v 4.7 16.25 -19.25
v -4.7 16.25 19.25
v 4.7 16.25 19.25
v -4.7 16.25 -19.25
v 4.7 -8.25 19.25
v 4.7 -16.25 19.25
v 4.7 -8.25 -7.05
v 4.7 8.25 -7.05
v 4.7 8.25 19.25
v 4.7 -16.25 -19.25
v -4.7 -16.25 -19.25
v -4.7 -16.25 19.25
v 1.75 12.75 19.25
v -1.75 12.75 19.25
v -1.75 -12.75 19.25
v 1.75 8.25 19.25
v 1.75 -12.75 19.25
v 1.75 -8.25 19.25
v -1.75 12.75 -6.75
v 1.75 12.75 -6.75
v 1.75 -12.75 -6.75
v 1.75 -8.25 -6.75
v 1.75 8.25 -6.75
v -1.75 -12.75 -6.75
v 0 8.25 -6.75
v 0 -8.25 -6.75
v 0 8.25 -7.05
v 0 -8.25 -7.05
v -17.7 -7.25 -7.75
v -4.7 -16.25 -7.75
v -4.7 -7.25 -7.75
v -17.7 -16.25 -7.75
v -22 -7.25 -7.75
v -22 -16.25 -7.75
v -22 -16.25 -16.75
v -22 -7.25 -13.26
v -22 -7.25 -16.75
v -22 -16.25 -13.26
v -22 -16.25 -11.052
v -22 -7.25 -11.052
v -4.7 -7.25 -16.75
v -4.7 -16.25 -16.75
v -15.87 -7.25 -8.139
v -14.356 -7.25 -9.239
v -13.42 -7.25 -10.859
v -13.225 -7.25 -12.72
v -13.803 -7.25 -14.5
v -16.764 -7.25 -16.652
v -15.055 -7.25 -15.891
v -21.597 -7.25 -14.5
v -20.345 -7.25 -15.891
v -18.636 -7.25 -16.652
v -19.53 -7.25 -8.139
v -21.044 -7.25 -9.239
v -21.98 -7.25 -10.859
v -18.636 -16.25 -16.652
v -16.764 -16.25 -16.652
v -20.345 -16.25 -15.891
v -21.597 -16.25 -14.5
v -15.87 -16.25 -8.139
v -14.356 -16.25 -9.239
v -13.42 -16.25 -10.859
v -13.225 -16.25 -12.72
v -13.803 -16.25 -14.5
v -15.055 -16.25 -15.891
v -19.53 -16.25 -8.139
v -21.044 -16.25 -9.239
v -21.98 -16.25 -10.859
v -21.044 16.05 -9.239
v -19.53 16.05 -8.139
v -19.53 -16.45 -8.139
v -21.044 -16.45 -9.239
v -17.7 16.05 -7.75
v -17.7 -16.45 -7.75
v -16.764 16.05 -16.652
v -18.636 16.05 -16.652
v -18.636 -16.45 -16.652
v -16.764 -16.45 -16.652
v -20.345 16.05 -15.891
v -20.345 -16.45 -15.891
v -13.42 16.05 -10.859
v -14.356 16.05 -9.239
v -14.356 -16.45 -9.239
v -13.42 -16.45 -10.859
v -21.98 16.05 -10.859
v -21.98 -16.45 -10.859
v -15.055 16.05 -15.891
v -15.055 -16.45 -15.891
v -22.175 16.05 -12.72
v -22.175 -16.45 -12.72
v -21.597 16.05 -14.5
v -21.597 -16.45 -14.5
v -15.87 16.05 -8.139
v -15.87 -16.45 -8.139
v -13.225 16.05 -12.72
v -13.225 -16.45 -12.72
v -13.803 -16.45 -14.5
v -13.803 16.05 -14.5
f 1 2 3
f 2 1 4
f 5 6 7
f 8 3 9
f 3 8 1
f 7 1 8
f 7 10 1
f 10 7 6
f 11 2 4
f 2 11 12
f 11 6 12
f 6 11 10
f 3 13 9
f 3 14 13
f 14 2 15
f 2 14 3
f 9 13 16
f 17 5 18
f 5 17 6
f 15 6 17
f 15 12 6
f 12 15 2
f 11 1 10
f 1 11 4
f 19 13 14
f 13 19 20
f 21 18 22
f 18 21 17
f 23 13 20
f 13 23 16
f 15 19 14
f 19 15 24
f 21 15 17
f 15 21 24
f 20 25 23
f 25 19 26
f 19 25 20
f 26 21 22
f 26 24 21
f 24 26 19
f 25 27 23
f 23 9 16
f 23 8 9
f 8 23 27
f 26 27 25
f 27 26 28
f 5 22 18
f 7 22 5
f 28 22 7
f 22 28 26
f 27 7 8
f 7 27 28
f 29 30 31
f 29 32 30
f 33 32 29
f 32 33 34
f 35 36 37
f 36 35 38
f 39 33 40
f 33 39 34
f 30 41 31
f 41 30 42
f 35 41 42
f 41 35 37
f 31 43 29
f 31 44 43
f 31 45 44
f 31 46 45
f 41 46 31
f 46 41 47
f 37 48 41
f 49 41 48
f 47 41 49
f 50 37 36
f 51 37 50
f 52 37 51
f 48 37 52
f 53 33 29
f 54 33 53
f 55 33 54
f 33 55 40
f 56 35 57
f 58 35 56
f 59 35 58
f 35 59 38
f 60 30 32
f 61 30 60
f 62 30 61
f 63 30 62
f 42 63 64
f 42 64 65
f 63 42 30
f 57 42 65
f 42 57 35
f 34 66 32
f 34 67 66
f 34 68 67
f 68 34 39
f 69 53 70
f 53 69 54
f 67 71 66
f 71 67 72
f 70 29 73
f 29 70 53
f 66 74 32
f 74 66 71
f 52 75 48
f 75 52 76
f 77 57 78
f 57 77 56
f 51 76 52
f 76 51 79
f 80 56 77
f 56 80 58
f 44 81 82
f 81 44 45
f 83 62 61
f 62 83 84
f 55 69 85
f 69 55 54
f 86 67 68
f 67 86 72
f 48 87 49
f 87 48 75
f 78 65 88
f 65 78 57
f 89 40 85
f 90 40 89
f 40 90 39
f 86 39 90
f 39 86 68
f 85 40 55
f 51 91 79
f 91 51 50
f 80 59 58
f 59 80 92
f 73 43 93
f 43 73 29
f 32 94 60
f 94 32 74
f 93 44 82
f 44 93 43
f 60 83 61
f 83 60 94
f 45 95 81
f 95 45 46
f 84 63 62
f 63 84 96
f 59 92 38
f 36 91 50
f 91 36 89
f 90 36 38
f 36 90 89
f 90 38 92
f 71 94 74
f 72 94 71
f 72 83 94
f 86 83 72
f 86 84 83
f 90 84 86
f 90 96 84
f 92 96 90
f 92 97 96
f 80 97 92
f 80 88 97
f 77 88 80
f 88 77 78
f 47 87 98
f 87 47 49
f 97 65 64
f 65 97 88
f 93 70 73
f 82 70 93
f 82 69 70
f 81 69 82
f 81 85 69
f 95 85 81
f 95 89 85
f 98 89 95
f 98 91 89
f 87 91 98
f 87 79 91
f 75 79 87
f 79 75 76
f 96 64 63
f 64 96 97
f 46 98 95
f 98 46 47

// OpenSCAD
/*
 *  OpenSCAD threaded rod holder 
 *  Copyright (C) 2013 Mogue Carpenter
 *
 *  License: LGPL 2.1 or later
 *
 *  A simple holder to hold a toilet seat
 *  onto a bow.
*/

rotate([90,0,90])
seat_hook();

module seat_hook(){
	base();
	rotate([180,0,90])
		translate([-(32.5/2)+(13-9),-((32.5/2)-(9/2)),(9.4/2)+((26.7-9.4)/2)])
			hook();
}

module hook(){
	cube([9,9,26.7-9.4],center = true);
	translate([0,(32.5-9.4)/2,(26.7/2)-(9) ] )
		rotate ([90,0,0])
			cylinder(h = 32.5, r = 9/2,center = true);

}

module base(){
	difference () {
		cube (size=[32.5,38.5,9.4], center=true);
		translate([0,9,0])
			cube (size=[1+32.5-8,38.5-(3.5*2),3.5],center=true);
		translate([0,8.2,5])
			cube (size=[32.5-(8*2),38.5-(8),10],center=true);
	};
};
